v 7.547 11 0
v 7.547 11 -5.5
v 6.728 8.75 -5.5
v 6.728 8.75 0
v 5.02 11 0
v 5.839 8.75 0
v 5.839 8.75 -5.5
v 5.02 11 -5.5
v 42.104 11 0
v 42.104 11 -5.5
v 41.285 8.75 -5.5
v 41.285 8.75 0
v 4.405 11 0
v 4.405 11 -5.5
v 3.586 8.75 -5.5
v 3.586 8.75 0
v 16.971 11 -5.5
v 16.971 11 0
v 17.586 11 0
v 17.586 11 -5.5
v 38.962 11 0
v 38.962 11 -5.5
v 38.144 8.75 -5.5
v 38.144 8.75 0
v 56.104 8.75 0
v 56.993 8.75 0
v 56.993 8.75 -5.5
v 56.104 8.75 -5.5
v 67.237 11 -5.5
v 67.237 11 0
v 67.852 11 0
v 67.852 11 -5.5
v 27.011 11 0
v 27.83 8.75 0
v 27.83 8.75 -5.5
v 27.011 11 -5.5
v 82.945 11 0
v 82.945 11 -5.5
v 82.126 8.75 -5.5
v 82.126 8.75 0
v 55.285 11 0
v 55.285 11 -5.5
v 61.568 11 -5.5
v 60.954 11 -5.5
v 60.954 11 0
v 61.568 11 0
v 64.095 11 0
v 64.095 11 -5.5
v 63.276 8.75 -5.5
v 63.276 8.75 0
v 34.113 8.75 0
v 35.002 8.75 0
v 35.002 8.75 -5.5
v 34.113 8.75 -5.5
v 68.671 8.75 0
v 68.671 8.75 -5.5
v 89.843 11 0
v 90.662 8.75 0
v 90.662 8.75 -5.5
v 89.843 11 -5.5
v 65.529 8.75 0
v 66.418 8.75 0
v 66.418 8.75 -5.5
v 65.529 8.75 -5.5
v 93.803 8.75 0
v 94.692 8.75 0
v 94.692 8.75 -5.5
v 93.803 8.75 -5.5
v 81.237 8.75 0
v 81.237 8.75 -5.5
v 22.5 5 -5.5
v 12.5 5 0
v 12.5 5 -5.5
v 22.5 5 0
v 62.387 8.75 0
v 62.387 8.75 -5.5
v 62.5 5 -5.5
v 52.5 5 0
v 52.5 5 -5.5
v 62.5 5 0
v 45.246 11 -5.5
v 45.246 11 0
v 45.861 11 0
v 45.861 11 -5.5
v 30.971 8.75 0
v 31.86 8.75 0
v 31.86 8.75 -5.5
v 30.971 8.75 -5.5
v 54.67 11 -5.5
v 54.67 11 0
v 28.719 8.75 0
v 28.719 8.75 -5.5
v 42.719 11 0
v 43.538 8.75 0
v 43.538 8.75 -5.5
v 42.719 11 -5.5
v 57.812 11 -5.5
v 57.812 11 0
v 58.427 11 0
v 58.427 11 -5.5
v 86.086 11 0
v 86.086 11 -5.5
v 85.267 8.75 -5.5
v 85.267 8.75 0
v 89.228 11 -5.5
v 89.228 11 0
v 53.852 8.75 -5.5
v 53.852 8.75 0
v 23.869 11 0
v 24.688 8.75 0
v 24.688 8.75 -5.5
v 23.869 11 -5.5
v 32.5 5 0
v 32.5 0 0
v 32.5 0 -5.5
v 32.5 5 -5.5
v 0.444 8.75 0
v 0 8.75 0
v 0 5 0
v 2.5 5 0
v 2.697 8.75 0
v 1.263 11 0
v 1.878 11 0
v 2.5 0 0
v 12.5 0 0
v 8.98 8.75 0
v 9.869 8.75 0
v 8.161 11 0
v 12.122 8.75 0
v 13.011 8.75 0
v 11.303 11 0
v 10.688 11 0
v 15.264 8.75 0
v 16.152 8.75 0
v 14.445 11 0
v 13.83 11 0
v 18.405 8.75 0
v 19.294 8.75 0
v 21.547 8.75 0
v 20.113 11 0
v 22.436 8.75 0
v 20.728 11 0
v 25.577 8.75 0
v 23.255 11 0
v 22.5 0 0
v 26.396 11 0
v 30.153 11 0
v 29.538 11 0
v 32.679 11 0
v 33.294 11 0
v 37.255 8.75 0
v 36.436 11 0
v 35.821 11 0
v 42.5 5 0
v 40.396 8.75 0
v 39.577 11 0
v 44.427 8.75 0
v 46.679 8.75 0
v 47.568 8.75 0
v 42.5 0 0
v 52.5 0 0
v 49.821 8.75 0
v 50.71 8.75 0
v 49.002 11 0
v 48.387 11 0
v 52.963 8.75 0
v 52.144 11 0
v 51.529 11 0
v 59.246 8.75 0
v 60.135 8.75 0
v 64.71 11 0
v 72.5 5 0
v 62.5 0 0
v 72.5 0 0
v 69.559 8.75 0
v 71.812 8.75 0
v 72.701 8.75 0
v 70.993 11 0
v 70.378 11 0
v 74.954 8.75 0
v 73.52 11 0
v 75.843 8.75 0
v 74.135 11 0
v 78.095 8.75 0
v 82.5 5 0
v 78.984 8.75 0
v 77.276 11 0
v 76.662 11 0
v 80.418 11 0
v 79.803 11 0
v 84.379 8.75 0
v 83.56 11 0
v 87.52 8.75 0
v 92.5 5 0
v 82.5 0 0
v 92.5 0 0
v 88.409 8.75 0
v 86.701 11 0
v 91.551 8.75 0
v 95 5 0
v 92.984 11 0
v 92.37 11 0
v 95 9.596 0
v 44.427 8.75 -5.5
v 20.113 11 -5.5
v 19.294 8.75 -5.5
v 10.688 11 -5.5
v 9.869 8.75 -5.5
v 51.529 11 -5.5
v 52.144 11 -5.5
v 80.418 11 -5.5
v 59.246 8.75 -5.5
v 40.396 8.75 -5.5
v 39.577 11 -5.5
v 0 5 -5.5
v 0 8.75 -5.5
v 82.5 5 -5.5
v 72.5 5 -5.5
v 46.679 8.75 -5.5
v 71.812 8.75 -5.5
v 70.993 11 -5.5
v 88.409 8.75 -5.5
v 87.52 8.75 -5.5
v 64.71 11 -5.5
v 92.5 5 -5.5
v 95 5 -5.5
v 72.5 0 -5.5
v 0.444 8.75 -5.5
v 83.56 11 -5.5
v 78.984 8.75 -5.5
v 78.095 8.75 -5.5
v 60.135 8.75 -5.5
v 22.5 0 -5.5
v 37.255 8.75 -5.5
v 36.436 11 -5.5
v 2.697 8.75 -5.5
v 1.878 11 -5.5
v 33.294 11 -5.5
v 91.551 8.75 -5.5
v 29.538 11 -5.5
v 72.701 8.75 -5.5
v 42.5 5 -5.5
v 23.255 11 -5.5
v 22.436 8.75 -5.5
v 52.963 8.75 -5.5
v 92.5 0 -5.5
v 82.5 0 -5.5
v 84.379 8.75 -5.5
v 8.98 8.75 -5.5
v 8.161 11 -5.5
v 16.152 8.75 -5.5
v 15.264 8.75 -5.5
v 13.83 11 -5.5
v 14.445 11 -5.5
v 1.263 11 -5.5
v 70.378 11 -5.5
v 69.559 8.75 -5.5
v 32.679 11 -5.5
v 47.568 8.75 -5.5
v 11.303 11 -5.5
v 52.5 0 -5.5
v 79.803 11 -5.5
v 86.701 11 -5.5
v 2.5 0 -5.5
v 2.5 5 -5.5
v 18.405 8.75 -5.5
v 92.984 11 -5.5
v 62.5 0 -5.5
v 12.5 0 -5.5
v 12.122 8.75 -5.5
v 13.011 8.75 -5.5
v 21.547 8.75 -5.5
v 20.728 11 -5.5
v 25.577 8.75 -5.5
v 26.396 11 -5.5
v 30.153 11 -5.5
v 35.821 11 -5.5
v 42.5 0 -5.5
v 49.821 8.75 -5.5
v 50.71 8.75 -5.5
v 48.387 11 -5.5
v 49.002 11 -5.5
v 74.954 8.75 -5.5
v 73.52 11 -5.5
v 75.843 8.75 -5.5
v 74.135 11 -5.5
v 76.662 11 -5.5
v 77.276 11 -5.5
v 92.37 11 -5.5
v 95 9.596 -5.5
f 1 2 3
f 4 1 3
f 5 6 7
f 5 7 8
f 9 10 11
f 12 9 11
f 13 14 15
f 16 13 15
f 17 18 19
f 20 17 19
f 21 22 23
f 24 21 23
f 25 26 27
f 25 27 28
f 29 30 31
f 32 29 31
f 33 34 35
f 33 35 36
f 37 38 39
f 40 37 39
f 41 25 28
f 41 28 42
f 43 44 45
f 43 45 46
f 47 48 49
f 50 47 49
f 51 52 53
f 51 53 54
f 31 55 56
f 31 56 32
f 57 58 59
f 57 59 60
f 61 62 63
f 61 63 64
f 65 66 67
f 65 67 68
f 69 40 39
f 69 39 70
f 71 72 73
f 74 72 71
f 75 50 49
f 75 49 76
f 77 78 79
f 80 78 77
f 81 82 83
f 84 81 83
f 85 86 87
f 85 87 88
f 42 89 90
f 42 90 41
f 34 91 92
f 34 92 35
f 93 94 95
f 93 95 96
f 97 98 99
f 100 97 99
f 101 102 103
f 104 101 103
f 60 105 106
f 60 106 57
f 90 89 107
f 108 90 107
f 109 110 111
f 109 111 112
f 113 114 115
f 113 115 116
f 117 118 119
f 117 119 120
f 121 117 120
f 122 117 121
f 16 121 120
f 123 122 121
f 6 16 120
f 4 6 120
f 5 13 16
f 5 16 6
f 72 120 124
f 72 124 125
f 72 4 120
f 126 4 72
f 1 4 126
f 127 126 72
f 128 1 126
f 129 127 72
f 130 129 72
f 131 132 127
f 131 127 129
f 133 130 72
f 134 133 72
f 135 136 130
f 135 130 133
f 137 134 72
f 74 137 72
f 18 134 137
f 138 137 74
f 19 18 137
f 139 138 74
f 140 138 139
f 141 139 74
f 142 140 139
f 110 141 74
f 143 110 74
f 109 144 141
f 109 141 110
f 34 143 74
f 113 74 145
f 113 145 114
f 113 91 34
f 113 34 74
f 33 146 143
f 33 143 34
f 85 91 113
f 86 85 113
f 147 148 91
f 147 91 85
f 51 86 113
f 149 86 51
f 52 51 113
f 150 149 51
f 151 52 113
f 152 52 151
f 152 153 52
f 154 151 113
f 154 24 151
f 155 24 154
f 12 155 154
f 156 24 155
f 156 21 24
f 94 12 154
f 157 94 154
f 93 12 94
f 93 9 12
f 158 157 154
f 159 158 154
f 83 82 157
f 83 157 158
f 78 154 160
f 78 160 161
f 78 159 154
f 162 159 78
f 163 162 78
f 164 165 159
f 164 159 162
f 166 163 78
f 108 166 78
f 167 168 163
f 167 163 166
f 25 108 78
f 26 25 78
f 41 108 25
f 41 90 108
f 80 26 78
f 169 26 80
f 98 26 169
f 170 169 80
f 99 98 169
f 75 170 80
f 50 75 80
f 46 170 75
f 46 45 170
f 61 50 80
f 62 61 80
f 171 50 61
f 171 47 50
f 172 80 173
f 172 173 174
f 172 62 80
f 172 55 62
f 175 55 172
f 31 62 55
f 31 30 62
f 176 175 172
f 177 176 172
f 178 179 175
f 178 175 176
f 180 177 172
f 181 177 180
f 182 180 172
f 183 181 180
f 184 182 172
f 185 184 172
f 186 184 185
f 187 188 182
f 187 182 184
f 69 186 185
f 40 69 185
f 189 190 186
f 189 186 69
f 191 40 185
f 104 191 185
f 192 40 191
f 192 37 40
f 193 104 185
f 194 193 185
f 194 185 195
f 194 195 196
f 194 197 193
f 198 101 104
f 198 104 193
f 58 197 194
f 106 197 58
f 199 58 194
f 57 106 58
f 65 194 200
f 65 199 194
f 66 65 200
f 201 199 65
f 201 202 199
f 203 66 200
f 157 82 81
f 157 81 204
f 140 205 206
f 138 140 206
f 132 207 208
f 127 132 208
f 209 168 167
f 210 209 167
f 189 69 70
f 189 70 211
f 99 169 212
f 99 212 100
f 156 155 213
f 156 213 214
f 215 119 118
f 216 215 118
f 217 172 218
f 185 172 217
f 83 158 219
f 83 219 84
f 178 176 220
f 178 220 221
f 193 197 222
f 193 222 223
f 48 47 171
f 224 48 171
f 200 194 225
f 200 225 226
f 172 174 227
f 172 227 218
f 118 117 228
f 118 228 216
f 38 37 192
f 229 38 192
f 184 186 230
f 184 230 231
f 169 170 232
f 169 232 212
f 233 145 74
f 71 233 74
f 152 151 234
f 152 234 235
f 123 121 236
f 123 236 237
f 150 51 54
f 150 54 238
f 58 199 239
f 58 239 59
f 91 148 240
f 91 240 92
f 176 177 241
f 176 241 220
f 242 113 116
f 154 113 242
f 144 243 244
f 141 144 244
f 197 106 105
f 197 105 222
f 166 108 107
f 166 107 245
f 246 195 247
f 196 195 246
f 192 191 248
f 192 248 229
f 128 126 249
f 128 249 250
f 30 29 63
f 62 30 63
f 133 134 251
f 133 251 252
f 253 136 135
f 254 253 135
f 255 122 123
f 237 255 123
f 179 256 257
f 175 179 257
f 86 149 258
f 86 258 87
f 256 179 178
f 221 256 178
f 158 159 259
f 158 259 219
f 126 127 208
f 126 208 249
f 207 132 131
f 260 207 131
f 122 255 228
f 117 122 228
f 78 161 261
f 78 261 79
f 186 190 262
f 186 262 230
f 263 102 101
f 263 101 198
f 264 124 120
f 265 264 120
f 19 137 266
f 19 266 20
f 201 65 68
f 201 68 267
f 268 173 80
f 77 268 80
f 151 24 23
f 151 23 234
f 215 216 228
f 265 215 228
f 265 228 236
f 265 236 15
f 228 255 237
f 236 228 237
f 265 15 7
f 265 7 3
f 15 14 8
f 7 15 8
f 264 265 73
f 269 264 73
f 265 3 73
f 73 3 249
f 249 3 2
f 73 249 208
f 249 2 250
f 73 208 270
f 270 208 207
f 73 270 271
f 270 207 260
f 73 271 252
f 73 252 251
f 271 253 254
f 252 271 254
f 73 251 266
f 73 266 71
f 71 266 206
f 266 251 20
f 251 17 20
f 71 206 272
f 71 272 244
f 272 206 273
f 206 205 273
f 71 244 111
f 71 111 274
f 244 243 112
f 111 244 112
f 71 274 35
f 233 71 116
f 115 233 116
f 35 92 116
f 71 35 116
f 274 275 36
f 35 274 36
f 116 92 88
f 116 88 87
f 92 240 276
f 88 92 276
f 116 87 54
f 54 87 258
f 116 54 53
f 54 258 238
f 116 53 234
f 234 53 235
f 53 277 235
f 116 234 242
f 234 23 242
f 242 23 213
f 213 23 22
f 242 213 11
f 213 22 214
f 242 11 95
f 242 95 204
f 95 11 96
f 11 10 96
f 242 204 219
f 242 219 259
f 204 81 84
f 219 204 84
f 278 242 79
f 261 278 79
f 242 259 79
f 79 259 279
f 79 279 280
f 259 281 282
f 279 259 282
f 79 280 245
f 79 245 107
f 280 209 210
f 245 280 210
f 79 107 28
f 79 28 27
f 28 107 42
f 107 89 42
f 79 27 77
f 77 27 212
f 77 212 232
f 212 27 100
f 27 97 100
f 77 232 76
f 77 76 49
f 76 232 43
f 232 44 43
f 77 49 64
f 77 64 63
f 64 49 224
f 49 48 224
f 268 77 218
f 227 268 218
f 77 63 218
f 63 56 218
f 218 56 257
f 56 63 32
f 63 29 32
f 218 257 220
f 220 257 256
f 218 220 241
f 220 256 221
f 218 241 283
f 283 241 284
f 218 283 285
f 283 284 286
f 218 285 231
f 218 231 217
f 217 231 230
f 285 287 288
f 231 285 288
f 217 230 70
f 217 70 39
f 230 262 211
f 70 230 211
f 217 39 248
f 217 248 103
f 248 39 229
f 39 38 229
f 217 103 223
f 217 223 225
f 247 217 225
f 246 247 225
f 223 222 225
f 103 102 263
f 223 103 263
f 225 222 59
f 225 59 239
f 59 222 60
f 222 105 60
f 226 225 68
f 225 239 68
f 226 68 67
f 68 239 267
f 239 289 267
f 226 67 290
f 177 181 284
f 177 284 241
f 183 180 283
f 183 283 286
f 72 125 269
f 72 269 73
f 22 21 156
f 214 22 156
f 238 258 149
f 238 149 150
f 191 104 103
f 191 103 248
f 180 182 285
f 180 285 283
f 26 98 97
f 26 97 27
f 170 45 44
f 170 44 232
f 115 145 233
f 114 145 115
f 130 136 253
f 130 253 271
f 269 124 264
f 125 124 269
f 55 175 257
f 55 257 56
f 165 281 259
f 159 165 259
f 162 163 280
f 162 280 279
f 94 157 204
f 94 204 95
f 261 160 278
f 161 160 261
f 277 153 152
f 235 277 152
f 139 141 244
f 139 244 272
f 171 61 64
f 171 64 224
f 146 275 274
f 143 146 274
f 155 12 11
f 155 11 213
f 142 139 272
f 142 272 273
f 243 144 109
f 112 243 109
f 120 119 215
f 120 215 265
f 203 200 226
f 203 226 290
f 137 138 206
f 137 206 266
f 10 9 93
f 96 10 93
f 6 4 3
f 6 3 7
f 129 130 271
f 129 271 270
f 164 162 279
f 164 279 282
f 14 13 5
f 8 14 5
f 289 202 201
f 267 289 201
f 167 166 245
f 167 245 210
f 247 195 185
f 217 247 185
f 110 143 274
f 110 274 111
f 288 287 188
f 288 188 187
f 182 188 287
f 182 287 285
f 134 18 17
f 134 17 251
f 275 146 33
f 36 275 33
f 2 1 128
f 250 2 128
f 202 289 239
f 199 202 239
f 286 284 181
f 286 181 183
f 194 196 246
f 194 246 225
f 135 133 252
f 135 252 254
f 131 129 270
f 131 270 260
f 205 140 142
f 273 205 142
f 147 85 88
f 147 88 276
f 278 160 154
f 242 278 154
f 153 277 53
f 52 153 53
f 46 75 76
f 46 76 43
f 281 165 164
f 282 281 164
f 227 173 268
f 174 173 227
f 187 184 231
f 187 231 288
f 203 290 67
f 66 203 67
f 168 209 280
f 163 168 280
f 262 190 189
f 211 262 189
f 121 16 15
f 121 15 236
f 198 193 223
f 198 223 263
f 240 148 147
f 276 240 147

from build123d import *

# Parameters (mm, degrees)
BLANKSKE_W          = 95
BLANKSKE_H          = 11
BLANK_DEPTH         = 5.5
TOOTHCUTSIM_DEPTH   = 96.792745028
TEETHCUTS_COUNT     = 31
TEETHCUTS_PITCH     = 3.14159265
SKETCH_1_W          = 10
SKETCH_1_H          = 5
CUT_EXTRUDE_1_DEPTH = 96.792745028


with BuildPart() as part:
    # BlankSke → Blank (new body)
    with BuildSketch(Plane.XY):
        with Locations((47.5, 5.5)):
            Rectangle(BLANKSKE_W, BLANKSKE_H)
    extrude(amount=-BLANK_DEPTH)

    # TooCutSkeSim → ToothCutSim (cut, through all)
    with BuildSketch(Plane.XY):
        Polygon((0.44443537, 8.75), (-0.44443537, 8.75), (-1.272613241, 11.0254), (1.272613241, 11.0254), align=None)
    toothcutsim = extrude(amount=-TOOTHCUTSIM_DEPTH, mode=Mode.SUBTRACT)

    # TeethCuts: ToothCutSim ×31
    with Locations(*[(i * TEETHCUTS_PITCH, 0, 0) for i in range(1, TEETHCUTS_COUNT)]):
        add(toothcutsim, mode=Mode.SUBTRACT)

    # ｽｹｯﾁ1 → ｶｯﾄ - 押し出し1 (cut, through all)
    with BuildSketch(Plane.XY):
        with Locations((-2.5, 2.5)):
            Rectangle(SKETCH_1_W, SKETCH_1_H)
        with Locations((17.5, 2.5)):
            Rectangle(SKETCH_1_W, SKETCH_1_H)
        with Locations((37.5, 2.5)):
            Rectangle(SKETCH_1_W, SKETCH_1_H)
        with Locations((57.5, 2.5)):
            Rectangle(SKETCH_1_W, SKETCH_1_H)
        with Locations((77.5, 2.5)):
            Rectangle(SKETCH_1_W, SKETCH_1_H)
        with Locations((97.5, 2.5)):
            Rectangle(SKETCH_1_W, SKETCH_1_H)
    extrude(amount=-CUT_EXTRUDE_1_DEPTH, mode=Mode.SUBTRACT)


solid = part.part
